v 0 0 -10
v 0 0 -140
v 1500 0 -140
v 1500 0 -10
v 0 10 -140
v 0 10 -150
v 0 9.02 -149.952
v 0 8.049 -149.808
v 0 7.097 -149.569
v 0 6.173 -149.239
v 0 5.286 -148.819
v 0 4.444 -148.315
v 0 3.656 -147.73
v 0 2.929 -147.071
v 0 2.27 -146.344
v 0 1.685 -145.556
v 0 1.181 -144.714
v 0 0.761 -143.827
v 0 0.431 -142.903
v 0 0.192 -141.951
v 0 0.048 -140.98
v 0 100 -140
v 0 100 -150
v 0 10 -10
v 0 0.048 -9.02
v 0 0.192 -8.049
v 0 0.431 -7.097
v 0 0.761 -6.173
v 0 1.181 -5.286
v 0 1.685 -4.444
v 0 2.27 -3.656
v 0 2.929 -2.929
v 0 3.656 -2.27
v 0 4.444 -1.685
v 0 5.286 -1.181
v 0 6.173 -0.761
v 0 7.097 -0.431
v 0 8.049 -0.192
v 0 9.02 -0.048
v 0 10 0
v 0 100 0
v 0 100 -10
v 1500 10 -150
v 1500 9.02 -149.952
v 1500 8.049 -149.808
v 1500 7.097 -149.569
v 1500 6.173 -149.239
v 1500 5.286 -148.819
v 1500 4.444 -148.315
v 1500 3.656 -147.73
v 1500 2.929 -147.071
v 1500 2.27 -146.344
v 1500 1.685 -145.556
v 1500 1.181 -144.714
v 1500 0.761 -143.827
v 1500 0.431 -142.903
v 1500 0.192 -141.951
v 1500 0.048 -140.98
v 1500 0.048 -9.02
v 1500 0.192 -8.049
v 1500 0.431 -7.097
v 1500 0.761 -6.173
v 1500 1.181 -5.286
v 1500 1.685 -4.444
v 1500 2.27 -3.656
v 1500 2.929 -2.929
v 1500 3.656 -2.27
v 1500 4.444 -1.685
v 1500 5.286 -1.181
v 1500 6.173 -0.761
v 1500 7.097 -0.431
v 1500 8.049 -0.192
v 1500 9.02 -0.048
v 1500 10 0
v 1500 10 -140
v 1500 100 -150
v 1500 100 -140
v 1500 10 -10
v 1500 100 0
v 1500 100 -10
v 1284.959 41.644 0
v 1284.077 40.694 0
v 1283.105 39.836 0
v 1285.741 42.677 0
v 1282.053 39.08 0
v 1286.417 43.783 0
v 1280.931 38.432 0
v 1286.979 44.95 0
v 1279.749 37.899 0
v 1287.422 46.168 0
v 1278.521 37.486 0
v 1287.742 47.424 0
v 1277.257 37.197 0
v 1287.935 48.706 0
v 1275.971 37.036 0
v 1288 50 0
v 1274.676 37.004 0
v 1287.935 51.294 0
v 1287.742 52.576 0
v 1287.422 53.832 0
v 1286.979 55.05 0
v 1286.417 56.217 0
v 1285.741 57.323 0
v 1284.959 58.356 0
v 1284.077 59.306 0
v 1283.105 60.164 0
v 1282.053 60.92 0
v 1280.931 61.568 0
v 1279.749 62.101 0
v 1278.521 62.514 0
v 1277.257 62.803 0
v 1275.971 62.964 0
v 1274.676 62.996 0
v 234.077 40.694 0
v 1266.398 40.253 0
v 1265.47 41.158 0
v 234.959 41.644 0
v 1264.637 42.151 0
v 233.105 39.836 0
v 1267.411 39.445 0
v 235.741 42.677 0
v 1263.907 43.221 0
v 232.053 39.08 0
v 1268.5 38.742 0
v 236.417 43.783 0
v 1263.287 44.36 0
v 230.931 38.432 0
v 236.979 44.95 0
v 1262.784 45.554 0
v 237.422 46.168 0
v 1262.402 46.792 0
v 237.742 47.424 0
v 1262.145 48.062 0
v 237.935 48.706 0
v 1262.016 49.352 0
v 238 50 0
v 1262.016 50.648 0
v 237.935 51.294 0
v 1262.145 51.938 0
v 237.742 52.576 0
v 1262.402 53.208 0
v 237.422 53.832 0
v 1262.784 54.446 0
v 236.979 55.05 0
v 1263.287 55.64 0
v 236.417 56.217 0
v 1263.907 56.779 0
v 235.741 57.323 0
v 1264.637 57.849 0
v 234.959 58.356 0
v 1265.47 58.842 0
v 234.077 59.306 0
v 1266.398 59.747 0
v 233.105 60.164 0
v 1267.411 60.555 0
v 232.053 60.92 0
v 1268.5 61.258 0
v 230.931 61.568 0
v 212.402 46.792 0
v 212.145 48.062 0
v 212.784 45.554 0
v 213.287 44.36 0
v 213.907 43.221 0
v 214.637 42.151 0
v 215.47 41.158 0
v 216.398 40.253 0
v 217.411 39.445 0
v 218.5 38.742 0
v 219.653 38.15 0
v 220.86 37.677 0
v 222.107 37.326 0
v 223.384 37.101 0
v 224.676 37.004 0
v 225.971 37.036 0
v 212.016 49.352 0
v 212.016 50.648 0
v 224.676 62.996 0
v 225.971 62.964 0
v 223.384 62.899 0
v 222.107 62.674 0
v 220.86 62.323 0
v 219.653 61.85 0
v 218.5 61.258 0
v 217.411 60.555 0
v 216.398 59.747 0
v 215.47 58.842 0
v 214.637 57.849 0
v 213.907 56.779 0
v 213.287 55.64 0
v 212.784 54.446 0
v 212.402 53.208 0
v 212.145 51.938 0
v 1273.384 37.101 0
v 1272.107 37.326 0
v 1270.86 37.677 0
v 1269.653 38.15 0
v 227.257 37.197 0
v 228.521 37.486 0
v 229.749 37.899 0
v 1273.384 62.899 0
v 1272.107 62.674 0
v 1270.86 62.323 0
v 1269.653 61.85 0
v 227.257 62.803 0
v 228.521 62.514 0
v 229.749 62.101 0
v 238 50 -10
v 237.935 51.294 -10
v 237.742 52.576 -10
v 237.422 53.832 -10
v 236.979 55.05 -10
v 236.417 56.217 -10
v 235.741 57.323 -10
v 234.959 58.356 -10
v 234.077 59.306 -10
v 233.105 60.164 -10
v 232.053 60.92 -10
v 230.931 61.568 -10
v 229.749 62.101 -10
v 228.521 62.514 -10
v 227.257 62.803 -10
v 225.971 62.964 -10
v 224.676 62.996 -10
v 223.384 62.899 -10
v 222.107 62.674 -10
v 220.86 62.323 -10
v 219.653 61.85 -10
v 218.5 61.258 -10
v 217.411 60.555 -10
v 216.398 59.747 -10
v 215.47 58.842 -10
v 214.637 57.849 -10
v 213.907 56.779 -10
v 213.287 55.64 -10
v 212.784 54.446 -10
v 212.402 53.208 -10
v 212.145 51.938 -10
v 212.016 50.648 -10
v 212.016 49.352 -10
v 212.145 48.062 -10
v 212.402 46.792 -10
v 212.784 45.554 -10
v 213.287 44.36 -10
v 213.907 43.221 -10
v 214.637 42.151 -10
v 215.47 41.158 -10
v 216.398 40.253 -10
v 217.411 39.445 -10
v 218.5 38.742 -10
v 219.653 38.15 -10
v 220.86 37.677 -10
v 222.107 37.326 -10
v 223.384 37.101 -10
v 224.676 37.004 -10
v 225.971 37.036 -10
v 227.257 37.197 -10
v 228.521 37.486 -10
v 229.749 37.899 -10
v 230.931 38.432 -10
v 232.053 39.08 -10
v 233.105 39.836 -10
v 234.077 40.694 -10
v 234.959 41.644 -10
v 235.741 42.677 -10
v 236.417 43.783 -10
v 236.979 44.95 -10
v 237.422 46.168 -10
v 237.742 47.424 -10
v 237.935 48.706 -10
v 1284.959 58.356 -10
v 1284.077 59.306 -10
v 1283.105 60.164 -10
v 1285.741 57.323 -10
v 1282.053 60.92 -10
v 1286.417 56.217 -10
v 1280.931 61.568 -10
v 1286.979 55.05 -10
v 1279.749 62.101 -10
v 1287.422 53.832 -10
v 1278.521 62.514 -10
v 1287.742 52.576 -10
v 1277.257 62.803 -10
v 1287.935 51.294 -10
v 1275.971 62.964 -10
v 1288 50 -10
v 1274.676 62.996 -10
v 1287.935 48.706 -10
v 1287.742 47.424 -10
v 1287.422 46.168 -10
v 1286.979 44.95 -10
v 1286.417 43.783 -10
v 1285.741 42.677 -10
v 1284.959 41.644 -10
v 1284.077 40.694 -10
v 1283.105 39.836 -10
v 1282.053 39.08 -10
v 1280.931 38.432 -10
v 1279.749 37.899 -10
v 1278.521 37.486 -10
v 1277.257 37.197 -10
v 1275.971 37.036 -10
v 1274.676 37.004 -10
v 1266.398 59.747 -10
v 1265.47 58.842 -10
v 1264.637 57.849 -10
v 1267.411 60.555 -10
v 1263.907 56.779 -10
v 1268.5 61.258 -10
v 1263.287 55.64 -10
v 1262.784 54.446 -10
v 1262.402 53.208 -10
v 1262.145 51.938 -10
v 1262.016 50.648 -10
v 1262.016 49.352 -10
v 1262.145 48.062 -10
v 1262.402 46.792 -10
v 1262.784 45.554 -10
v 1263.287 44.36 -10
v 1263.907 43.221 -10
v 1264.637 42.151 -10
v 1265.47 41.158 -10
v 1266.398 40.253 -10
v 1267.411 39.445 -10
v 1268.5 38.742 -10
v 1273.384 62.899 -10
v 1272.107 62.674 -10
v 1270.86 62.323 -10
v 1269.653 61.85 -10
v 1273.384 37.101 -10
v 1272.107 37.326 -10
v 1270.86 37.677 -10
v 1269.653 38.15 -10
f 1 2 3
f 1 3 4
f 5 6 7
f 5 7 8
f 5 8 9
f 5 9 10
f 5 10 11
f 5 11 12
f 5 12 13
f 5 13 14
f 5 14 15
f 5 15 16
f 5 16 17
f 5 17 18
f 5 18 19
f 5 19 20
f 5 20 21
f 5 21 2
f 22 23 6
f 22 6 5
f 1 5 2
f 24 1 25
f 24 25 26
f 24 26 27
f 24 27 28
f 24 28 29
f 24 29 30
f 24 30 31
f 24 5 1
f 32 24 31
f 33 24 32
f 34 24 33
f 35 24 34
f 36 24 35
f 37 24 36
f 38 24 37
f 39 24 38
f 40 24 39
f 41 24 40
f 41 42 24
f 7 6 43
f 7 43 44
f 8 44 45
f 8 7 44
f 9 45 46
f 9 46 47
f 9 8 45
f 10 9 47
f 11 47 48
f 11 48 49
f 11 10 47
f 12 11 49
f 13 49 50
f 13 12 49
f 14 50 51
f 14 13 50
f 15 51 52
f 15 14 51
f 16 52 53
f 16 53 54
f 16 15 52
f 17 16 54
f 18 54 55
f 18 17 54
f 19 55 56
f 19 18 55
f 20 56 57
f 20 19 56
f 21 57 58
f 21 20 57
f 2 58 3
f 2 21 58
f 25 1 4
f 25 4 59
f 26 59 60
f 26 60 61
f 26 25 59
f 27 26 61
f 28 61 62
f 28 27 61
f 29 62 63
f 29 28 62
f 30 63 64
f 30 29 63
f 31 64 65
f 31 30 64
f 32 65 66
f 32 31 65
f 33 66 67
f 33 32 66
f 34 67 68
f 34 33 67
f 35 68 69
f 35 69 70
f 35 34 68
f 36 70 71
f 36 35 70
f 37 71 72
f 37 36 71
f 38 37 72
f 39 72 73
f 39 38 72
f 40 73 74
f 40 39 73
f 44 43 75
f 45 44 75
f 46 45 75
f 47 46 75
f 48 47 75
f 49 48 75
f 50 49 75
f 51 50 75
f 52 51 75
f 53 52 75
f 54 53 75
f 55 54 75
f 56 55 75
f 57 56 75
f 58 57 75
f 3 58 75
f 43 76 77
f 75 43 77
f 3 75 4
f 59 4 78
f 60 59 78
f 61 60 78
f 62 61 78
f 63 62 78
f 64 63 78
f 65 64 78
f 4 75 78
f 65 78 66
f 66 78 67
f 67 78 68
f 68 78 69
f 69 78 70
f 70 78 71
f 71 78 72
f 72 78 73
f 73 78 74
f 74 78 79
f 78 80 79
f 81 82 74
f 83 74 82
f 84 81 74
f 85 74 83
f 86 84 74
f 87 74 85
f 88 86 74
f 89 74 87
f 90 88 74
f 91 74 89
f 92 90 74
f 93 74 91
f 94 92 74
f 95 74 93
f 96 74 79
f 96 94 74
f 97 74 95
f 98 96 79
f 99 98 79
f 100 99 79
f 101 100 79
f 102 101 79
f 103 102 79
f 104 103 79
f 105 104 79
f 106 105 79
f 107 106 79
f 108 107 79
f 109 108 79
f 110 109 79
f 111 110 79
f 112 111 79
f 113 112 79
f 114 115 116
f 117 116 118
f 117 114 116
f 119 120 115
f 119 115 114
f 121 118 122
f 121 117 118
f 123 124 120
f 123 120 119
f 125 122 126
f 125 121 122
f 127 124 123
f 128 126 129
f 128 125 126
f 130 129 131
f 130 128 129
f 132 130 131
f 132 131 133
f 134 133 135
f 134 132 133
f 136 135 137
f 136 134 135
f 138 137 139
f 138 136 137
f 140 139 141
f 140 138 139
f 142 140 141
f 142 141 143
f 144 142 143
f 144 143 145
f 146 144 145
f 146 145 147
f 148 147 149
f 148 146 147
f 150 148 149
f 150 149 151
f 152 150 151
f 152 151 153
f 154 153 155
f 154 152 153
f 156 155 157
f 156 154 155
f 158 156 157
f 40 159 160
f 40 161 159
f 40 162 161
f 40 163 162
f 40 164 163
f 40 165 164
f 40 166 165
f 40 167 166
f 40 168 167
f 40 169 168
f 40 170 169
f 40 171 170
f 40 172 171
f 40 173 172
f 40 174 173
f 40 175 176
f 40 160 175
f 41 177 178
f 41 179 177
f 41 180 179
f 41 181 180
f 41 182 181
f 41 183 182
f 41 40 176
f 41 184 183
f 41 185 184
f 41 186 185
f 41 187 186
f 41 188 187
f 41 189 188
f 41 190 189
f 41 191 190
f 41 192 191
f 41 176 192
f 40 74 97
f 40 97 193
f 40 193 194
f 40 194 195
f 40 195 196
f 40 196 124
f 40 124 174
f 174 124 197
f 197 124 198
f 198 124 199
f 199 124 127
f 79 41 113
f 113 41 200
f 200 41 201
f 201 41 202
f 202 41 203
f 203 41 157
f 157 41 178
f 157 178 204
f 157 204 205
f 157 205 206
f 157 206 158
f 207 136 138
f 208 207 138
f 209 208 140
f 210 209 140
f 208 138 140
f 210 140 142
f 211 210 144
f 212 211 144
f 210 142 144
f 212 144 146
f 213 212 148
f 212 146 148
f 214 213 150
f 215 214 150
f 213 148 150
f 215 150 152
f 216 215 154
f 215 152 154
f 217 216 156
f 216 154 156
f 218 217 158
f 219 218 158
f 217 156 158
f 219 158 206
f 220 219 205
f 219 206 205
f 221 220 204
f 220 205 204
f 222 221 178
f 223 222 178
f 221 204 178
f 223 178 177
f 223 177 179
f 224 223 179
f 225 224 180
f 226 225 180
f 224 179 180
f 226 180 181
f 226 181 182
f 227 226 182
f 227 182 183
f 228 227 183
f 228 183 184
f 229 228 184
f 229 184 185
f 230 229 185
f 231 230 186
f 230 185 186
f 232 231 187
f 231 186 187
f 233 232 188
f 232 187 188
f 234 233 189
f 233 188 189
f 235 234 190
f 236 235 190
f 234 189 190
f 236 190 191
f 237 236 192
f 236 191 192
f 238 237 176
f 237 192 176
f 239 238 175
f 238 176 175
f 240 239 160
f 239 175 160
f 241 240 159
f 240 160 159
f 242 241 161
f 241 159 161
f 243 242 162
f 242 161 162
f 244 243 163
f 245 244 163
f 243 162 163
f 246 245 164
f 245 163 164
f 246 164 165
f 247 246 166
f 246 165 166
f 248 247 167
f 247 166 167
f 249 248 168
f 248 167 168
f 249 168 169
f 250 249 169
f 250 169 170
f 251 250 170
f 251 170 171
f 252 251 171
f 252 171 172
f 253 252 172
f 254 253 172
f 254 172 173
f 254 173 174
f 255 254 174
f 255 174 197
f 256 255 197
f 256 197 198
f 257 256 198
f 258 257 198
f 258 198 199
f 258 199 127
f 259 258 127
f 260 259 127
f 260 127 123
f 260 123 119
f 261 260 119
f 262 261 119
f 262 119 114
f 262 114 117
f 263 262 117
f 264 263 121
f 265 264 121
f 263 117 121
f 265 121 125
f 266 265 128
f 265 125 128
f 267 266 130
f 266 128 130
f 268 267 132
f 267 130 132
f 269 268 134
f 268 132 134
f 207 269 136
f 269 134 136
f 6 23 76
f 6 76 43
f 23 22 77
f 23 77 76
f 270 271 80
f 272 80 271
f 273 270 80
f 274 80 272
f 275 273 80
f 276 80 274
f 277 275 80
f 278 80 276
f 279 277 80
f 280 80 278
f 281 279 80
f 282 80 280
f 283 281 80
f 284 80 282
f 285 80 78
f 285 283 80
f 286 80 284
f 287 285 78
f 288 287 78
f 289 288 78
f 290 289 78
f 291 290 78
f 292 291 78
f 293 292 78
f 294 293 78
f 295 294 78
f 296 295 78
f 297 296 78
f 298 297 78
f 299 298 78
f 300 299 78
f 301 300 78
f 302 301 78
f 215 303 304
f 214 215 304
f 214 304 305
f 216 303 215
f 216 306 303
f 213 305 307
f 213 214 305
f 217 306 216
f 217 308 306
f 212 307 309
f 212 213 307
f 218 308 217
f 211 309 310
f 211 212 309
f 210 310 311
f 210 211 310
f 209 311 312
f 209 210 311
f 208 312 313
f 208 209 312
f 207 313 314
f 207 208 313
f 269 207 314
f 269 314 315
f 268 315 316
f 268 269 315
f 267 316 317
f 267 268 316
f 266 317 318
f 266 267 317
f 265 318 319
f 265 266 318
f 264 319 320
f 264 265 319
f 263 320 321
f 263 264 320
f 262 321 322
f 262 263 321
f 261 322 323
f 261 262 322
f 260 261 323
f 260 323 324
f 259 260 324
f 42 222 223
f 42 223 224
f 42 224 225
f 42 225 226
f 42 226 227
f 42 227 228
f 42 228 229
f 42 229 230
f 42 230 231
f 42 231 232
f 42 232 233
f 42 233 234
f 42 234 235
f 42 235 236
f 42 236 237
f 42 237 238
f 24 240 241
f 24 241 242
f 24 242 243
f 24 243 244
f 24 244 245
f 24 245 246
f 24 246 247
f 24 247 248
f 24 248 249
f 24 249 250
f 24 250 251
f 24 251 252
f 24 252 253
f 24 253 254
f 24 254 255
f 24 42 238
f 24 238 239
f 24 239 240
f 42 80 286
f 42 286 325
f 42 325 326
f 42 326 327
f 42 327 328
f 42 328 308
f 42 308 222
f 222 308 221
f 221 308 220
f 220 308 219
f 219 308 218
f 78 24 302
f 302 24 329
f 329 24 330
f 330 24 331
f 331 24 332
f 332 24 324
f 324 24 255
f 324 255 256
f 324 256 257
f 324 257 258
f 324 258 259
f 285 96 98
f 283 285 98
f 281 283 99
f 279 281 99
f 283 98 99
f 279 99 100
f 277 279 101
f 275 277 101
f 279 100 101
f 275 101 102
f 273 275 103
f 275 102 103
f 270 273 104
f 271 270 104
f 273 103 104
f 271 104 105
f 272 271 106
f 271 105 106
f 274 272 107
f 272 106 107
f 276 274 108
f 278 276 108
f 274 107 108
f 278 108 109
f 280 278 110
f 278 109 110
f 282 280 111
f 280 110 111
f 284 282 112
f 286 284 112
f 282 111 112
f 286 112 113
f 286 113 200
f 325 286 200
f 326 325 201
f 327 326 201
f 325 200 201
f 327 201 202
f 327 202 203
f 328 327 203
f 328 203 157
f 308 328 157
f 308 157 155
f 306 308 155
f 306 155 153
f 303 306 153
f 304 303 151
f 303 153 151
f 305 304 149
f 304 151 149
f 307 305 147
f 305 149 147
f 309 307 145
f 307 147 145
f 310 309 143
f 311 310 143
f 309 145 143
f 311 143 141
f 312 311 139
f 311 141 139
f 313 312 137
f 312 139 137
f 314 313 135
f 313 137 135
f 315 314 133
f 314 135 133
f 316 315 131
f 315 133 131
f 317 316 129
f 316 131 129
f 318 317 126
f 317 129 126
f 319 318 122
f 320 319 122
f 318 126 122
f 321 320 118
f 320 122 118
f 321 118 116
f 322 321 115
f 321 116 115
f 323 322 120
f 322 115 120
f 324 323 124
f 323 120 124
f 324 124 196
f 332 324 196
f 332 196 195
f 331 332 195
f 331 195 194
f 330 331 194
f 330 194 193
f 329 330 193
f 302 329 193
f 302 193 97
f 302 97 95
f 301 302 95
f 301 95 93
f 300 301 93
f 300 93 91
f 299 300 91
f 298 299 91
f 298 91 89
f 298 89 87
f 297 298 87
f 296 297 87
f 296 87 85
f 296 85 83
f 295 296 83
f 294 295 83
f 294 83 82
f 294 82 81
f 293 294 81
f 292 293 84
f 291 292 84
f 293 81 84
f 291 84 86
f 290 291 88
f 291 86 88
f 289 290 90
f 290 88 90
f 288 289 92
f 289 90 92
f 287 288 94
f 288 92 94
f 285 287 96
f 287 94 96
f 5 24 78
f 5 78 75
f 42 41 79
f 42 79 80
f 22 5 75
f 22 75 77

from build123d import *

# Parameters (mm, degrees)
EXTRUDE1_DEPTH     = 1500
SKETCH2_R          = 13
CUT_EXTRUDE1_DEPTH = 10


with BuildPart() as part:
    # Sketch1 → Extrude1 (new body)
    with BuildSketch(Plane(origin=(0, 0, 0), x_dir=(0, 0, -1), z_dir=(1, 0, 0))):
        with BuildLine():
            Line((140, 10), (140, 100))
            Line((140, 100), (150, 100))
            Line((150, 100), (150, 10))
            ThreePointArc((150, 10), (147.071067812, 2.928932188), (140, 0))
            Line((140, 0), (10, 0))
            ThreePointArc((10, 0), (2.928932188, 2.928932188), (0, 10))
            Line((0, 10), (0, 100))
            Line((0, 100), (10, 100))
            Line((10, 100), (10, 10))
            Line((10, 10), (140, 10))
        make_face()
    extrude(amount=EXTRUDE1_DEPTH)

    # Sketch2 → Cut-Extrude1 (cut)
    with BuildSketch(Plane.XY):
        with Locations((225, 50)):
            Circle(SKETCH2_R)
        with Locations((1275, 50)):
            Circle(SKETCH2_R)
    extrude(amount=-CUT_EXTRUDE1_DEPTH, mode=Mode.SUBTRACT)


solid = part.part
